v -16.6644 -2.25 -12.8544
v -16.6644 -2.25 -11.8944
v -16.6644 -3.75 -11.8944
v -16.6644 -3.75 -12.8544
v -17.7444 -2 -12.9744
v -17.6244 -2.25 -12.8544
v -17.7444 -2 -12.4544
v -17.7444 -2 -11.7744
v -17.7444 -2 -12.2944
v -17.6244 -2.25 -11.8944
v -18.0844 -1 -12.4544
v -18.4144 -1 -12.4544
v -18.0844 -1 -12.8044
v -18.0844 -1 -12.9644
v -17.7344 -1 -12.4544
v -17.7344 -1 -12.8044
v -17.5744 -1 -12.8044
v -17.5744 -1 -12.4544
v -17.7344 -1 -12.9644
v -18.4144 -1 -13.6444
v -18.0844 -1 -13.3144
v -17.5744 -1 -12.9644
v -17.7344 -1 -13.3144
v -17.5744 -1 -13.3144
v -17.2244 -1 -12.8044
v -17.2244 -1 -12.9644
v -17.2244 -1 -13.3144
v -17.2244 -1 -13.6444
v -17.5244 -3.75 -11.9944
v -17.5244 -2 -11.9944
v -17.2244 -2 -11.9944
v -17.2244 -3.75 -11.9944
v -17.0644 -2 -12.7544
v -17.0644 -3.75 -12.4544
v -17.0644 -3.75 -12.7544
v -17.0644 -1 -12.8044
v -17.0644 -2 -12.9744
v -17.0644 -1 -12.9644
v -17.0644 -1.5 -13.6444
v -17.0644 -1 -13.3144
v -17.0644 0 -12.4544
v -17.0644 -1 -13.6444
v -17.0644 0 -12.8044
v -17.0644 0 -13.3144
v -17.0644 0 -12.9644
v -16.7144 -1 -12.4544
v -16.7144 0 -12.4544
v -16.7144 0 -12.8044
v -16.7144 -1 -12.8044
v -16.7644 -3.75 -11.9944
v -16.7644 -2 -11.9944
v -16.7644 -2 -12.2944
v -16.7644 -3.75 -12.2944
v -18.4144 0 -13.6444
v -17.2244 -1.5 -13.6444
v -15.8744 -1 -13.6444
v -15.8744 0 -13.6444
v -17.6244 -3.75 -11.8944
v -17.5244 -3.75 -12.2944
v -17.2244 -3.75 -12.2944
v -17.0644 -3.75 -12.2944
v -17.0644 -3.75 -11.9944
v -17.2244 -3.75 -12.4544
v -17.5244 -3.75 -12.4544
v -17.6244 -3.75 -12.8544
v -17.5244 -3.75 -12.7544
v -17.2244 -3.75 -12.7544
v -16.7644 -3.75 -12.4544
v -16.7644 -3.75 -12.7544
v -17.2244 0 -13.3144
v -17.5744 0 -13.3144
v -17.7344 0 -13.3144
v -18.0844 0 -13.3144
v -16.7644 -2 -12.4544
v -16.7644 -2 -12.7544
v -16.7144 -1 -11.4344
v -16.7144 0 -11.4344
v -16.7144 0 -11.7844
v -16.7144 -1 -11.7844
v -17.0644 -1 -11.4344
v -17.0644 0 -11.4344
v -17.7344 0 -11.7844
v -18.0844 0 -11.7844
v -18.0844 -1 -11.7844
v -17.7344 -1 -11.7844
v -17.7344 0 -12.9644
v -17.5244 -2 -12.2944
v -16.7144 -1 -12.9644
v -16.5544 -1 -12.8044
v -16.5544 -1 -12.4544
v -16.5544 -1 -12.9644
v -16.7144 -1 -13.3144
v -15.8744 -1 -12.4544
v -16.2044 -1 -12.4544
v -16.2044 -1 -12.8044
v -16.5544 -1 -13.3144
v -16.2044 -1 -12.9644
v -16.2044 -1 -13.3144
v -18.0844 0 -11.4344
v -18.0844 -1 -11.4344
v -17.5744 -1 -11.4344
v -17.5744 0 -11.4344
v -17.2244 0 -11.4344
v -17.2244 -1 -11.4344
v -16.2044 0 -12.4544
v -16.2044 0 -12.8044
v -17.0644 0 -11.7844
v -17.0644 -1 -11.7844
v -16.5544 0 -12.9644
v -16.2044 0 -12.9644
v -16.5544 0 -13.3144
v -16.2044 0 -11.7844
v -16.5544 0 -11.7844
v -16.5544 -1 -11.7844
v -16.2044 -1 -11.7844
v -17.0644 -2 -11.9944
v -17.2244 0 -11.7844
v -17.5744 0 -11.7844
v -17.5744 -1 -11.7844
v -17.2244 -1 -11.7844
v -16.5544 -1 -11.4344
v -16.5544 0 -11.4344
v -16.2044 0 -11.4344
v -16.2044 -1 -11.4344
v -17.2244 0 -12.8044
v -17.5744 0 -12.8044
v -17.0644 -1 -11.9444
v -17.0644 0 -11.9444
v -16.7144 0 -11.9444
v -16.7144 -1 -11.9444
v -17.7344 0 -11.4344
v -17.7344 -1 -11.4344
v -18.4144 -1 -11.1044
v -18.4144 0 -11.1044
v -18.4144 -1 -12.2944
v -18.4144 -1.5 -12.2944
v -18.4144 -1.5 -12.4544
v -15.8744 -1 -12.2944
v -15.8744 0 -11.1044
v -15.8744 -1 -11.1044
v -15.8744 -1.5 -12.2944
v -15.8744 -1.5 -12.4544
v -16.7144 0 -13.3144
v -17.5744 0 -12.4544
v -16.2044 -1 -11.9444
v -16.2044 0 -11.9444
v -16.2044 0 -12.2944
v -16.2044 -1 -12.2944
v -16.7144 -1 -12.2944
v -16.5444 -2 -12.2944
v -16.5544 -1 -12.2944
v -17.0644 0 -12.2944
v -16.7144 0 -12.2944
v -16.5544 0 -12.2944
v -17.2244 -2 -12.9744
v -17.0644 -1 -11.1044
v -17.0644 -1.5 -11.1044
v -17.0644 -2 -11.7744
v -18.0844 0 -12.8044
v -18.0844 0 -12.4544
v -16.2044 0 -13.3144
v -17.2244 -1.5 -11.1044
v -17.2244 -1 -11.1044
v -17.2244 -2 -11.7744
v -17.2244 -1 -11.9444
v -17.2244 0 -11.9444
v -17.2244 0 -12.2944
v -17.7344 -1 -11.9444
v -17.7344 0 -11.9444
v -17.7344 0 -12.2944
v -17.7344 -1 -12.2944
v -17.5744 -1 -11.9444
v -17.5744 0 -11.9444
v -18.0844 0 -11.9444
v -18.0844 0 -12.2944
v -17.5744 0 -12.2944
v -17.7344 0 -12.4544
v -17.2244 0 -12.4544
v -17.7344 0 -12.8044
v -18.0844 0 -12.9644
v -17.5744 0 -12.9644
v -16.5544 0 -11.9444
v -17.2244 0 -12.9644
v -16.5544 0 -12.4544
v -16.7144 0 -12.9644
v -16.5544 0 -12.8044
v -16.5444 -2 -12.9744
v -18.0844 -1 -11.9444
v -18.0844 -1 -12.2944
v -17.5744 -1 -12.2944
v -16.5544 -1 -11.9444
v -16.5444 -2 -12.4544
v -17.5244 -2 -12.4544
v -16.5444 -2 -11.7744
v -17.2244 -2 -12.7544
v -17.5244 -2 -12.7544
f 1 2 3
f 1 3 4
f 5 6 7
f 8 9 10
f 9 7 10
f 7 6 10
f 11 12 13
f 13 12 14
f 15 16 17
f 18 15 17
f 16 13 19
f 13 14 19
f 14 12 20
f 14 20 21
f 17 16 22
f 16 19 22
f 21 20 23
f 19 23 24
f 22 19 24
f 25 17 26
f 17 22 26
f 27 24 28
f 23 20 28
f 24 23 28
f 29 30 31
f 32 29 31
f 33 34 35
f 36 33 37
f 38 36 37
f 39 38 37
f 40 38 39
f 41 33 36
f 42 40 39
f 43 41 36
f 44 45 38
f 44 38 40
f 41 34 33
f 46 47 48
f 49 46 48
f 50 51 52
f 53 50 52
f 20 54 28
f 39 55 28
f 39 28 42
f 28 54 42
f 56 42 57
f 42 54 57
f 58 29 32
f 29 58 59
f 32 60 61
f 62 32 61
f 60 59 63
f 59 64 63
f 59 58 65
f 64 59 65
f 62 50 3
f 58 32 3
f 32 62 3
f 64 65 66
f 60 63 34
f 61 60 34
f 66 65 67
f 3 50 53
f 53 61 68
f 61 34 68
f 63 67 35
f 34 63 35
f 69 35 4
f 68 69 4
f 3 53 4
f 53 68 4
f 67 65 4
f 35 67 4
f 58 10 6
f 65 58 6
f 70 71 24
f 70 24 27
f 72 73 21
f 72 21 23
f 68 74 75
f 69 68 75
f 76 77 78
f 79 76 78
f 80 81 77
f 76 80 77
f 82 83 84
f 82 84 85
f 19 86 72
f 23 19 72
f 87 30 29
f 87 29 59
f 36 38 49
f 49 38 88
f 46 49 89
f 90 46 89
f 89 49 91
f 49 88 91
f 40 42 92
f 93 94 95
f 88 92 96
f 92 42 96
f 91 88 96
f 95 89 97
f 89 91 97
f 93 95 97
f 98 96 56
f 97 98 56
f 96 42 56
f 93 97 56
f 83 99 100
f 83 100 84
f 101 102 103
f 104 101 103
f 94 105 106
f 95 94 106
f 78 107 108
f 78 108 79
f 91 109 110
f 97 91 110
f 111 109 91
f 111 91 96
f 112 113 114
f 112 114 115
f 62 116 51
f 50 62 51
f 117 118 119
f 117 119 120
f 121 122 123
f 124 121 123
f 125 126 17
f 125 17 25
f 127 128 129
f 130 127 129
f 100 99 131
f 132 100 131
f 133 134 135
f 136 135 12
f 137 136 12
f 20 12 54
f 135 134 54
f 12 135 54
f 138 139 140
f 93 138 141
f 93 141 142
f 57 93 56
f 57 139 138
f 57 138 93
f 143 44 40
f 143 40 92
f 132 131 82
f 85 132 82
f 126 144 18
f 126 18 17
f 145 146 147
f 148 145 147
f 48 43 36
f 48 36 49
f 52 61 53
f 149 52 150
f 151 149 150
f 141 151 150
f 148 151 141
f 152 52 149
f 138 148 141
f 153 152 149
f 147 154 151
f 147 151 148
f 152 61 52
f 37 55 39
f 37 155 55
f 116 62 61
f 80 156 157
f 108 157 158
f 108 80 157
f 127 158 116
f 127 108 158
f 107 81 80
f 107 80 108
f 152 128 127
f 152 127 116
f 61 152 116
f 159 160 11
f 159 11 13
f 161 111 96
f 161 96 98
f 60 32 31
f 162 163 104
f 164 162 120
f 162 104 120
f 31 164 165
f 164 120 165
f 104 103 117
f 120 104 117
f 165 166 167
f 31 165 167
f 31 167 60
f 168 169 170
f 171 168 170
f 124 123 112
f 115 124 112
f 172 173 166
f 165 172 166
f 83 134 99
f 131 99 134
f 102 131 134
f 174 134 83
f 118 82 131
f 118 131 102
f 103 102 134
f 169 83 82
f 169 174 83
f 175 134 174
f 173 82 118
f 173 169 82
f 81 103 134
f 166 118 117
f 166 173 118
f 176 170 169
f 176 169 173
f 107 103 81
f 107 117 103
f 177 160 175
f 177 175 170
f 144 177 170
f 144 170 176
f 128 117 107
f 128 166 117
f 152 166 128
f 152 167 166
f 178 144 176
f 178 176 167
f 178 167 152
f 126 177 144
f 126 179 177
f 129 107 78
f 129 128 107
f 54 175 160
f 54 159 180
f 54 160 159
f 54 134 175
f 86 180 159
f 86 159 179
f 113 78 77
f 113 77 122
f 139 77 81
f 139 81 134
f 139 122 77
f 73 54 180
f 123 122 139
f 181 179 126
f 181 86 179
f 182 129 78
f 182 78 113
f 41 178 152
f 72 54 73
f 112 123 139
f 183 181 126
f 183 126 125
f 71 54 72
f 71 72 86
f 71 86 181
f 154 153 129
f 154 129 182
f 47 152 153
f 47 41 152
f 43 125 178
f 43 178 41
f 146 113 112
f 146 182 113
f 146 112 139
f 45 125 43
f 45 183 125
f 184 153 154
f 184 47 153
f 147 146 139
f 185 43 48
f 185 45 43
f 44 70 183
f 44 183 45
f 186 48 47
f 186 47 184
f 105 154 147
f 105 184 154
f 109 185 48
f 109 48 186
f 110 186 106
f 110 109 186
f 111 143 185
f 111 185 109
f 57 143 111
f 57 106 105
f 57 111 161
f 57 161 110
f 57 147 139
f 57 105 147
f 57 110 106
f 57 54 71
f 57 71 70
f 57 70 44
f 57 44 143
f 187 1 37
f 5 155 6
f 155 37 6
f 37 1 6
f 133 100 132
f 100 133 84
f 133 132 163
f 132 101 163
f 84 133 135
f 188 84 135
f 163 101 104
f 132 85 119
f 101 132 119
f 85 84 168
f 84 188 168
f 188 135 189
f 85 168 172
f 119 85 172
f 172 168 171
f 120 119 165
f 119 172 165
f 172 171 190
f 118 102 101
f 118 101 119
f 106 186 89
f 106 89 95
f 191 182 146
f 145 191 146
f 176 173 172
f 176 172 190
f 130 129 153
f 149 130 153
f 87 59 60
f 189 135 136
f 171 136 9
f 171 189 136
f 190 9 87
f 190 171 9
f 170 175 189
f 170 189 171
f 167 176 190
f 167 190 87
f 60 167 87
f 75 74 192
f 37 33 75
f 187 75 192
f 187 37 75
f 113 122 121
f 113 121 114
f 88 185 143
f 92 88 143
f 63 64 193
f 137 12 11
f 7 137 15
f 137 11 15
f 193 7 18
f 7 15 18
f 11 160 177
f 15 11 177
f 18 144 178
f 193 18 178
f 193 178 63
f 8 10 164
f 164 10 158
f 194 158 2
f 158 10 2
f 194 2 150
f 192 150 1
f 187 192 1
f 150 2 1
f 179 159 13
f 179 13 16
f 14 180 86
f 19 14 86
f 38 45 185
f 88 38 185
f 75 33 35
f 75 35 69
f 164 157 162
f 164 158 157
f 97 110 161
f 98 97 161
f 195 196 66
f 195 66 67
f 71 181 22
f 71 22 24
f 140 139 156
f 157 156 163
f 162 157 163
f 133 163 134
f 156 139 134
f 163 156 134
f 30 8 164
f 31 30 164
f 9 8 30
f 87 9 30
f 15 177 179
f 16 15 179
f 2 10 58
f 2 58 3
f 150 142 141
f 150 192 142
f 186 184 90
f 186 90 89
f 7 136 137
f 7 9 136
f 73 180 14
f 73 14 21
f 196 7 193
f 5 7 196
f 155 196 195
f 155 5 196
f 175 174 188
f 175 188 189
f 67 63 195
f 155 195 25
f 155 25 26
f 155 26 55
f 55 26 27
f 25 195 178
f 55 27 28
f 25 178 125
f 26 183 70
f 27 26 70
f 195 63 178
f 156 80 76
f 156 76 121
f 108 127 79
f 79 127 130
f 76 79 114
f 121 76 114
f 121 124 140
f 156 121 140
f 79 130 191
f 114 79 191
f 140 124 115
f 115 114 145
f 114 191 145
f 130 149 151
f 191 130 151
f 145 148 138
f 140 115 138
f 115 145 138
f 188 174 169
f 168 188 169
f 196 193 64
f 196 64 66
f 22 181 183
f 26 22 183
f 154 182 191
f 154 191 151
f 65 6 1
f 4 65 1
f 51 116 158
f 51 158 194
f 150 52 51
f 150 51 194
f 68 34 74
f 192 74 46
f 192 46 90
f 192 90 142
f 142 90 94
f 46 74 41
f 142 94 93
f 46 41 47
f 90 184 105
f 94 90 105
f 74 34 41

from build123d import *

# Parameters (mm, degrees)
TOP_PANEL_W            = 2.54
TOP_PANEL_H            = 2.54
BOSS_EXTRUDE1_DEPTH    = 1
WELL_HOLES_W           = 0.35
WELL_HOLES_H           = 0.35
WELLS_DEPTH            = 1
SKETCH5_W              = 2.54
SKETCH5_H              = 0.16
BOSS_EXTRUDE5_DEPTH    = 0.5
SKETCH4_W              = 1.2
SKETCH4_H              = 0.16
SUPPORT_WALL_SKETCH_W  = 0.16
SUPPORT_WALL_SKETCH_H  = 2.54
BOSS_EXTRUDE7_DEPTH    = 0.5
SKETCH7_W              = 0.16
SKETCH7_H              = 0.52
SKETCH7_3_W            = 0.16
SKETCH7_3_H            = 0.52
SKETCH8_W              = 1.2
SKETCH8_H              = 1.2
SKETCH9_W              = 0.96
SKETCH9_H              = 0.96
SKETCH9_2_W            = 0.96
SKETCH9_2_H            = 0.96
BOSS_EXTRUDE8_DEPTH    = 1.5
TETRODE_ENTRY_HOLDES_W = 0.3
TETRODE_ENTRY_HOLDES_H = 0.3
CUT_EXTRUDE1_DEPTH     = 1.75


with BuildPart() as part:
    # top_panel → Boss-Extrude1 (new body)
    with BuildSketch(Plane(origin=(0, 0, 0), x_dir=(1, 0, 0), z_dir=(0, 1, 0))):
        with Locations((-17.144369017, 12.374381862)):
            Rectangle(TOP_PANEL_W, TOP_PANEL_H)
    extrude(amount=-BOSS_EXTRUDE1_DEPTH)

    # well_holes → wells (cut)
    with BuildSketch(Plane(origin=(0, 0, 0), x_dir=(1, 0, 0), z_dir=(0, 1, 0))):
        with Locations((-17.399369017, 13.139381862)):
            Rectangle(WELL_HOLES_W, WELL_HOLES_H)
        with Locations((-17.909369017, 13.139381862)):
            Rectangle(WELL_HOLES_W, WELL_HOLES_H)
        with Locations((-16.889369017, 13.139381862)):
            Rectangle(WELL_HOLES_W, WELL_HOLES_H)
        with Locations((-16.379369017, 13.139381862)):
            Rectangle(WELL_HOLES_W, WELL_HOLES_H)
        with Locations((-17.399369017, 12.629381862)):
            Rectangle(WELL_HOLES_W, WELL_HOLES_H)
        with Locations((-16.889369017, 12.629381862)):
            Rectangle(WELL_HOLES_W, WELL_HOLES_H)
        with Locations((-16.379369017, 12.629381862)):
            Rectangle(WELL_HOLES_W, WELL_HOLES_H)
        with Locations((-17.399369017, 12.119381862)):
            Rectangle(WELL_HOLES_W, WELL_HOLES_H)
        with Locations((-16.889369017, 12.119381862)):
            Rectangle(WELL_HOLES_W, WELL_HOLES_H)
        with Locations((-16.379369017, 12.119381862)):
            Rectangle(WELL_HOLES_W, WELL_HOLES_H)
        with Locations((-17.399369017, 11.609381862)):
            Rectangle(WELL_HOLES_W, WELL_HOLES_H)
        with Locations((-16.889369017, 11.609381862)):
            Rectangle(WELL_HOLES_W, WELL_HOLES_H)
        with Locations((-16.379369017, 11.609381862)):
            Rectangle(WELL_HOLES_W, WELL_HOLES_H)
        with Locations((-17.909369017, 12.629381862)):
            Rectangle(WELL_HOLES_W, WELL_HOLES_H)
        with Locations((-17.909369017, 12.119381862)):
            Rectangle(WELL_HOLES_W, WELL_HOLES_H)
        with Locations((-17.909369017, 11.609381862)):
            Rectangle(WELL_HOLES_W, WELL_HOLES_H)
    extrude(amount=-WELLS_DEPTH, mode=Mode.SUBTRACT)

    # Sketch5 → Boss-Extrude5 (add)
    with BuildSketch(Plane(origin=(0, -1, 0), x_dir=(-1, 0, 0), z_dir=(0, -1, 0))):
        with Locations((17.144369017, 12.374381862)):
            Rectangle(SKETCH5_W, SKETCH5_H)
    extrude(amount=BOSS_EXTRUDE5_DEPTH)

    # Sketch4 → section 1 of loft3
    with BuildSketch(Plane(origin=(0, -2, 0), x_dir=(1, 0, 0), z_dir=(0, 1, 0)), mode=Mode.PRIVATE) as loft3_s1:
        with Locations((-17.144369017, 12.374381862)):
            Rectangle(SKETCH4_W, SKETCH4_H)
    # loft from a face of the part (loft3)
    loft([part.faces().sort_by_distance((-17.144369017, -1.5, -12.374381862))[0], loft3_s1.sketch])

    # support_wall_sketch → Boss-Extrude7 (add)
    with BuildSketch(Plane(origin=(0, -1, 0), x_dir=(-1, 0, 0), z_dir=(0, -1, 0))):
        with Locations((17.144369017, 12.374381862)):
            Rectangle(SUPPORT_WALL_SKETCH_W, SUPPORT_WALL_SKETCH_H)
    extrude(amount=BOSS_EXTRUDE7_DEPTH)

    # Sketch7 → section 1 of loft6
    with BuildSketch(Plane(origin=(0, -2, 0), x_dir=(1, 0, 0), z_dir=(0, 1, 0)), mode=Mode.PRIVATE) as loft6_s1:
        with Locations((-17.144369017, 12.034381862)):
            Rectangle(SKETCH7_W, SKETCH7_H)
    # loft from a face of the part (loft6)
    loft([part.faces().sort_by_distance((-17.144369017, -1.5, -11.699381862))[0], loft6_s1.sketch])

    # Sketch7<3> → section 1 of loft7
    with BuildSketch(Plane(origin=(0, -2, 0), x_dir=(1, 0, 0), z_dir=(0, 1, 0)), mode=Mode.PRIVATE) as loft7_s1:
        with Locations((-17.144369017, 12.714381862)):
            Rectangle(SKETCH7_3_W, SKETCH7_3_H)
    # loft from a face of the part (loft7)
    loft([part.faces().sort_by_distance((-17.144369017, -1.5, -13.049381862))[0], loft7_s1.sketch])

    # Sketch8 → Loft8 section 0
    with BuildSketch(Plane(origin=(0, -2, 0), x_dir=(1, 0, 0), z_dir=(0, 1, 0))):
        with Locations((-17.144369017, 12.374381862)):
            Rectangle(SKETCH8_W, SKETCH8_H)
    # Sketch9 → Loft8 section 1
    with BuildSketch(Plane(origin=(0, -2.25, 0), x_dir=(1, 0, 0), z_dir=(0, 1, 0))):
        with Locations((-17.144369017, 12.374381862)):
            Rectangle(SKETCH9_W, SKETCH9_H)
    loft()

    # Sketch9<2> → Boss-Extrude8 (add)
    with BuildSketch(Plane(origin=(0, -2.25, 0), x_dir=(1, 0, 0), z_dir=(0, 1, 0))):
        with Locations((-17.144369017, 12.374381862)):
            Rectangle(SKETCH9_2_W, SKETCH9_2_H)
    extrude(amount=-BOSS_EXTRUDE8_DEPTH)

    # tetrode_entry_holdes → Cut-Extrude1 (cut)
    with BuildSketch(Plane(origin=(0, -2, 0), x_dir=(1, 0, 0), z_dir=(0, 1, 0))):
        with Locations((-17.374369017, 12.144381862)):
            Rectangle(TETRODE_ENTRY_HOLDES_W, TETRODE_ENTRY_HOLDES_H)
        with Locations((-16.914369017, 12.144381862)):
            Rectangle(TETRODE_ENTRY_HOLDES_W, TETRODE_ENTRY_HOLDES_H)
        with Locations((-16.914369017, 12.604381862)):
            Rectangle(TETRODE_ENTRY_HOLDES_W, TETRODE_ENTRY_HOLDES_H)
        with Locations((-17.374369017, 12.604381862)):
            Rectangle(TETRODE_ENTRY_HOLDES_W, TETRODE_ENTRY_HOLDES_H)
    extrude(amount=-CUT_EXTRUDE1_DEPTH, mode=Mode.SUBTRACT)


solid = part.part
